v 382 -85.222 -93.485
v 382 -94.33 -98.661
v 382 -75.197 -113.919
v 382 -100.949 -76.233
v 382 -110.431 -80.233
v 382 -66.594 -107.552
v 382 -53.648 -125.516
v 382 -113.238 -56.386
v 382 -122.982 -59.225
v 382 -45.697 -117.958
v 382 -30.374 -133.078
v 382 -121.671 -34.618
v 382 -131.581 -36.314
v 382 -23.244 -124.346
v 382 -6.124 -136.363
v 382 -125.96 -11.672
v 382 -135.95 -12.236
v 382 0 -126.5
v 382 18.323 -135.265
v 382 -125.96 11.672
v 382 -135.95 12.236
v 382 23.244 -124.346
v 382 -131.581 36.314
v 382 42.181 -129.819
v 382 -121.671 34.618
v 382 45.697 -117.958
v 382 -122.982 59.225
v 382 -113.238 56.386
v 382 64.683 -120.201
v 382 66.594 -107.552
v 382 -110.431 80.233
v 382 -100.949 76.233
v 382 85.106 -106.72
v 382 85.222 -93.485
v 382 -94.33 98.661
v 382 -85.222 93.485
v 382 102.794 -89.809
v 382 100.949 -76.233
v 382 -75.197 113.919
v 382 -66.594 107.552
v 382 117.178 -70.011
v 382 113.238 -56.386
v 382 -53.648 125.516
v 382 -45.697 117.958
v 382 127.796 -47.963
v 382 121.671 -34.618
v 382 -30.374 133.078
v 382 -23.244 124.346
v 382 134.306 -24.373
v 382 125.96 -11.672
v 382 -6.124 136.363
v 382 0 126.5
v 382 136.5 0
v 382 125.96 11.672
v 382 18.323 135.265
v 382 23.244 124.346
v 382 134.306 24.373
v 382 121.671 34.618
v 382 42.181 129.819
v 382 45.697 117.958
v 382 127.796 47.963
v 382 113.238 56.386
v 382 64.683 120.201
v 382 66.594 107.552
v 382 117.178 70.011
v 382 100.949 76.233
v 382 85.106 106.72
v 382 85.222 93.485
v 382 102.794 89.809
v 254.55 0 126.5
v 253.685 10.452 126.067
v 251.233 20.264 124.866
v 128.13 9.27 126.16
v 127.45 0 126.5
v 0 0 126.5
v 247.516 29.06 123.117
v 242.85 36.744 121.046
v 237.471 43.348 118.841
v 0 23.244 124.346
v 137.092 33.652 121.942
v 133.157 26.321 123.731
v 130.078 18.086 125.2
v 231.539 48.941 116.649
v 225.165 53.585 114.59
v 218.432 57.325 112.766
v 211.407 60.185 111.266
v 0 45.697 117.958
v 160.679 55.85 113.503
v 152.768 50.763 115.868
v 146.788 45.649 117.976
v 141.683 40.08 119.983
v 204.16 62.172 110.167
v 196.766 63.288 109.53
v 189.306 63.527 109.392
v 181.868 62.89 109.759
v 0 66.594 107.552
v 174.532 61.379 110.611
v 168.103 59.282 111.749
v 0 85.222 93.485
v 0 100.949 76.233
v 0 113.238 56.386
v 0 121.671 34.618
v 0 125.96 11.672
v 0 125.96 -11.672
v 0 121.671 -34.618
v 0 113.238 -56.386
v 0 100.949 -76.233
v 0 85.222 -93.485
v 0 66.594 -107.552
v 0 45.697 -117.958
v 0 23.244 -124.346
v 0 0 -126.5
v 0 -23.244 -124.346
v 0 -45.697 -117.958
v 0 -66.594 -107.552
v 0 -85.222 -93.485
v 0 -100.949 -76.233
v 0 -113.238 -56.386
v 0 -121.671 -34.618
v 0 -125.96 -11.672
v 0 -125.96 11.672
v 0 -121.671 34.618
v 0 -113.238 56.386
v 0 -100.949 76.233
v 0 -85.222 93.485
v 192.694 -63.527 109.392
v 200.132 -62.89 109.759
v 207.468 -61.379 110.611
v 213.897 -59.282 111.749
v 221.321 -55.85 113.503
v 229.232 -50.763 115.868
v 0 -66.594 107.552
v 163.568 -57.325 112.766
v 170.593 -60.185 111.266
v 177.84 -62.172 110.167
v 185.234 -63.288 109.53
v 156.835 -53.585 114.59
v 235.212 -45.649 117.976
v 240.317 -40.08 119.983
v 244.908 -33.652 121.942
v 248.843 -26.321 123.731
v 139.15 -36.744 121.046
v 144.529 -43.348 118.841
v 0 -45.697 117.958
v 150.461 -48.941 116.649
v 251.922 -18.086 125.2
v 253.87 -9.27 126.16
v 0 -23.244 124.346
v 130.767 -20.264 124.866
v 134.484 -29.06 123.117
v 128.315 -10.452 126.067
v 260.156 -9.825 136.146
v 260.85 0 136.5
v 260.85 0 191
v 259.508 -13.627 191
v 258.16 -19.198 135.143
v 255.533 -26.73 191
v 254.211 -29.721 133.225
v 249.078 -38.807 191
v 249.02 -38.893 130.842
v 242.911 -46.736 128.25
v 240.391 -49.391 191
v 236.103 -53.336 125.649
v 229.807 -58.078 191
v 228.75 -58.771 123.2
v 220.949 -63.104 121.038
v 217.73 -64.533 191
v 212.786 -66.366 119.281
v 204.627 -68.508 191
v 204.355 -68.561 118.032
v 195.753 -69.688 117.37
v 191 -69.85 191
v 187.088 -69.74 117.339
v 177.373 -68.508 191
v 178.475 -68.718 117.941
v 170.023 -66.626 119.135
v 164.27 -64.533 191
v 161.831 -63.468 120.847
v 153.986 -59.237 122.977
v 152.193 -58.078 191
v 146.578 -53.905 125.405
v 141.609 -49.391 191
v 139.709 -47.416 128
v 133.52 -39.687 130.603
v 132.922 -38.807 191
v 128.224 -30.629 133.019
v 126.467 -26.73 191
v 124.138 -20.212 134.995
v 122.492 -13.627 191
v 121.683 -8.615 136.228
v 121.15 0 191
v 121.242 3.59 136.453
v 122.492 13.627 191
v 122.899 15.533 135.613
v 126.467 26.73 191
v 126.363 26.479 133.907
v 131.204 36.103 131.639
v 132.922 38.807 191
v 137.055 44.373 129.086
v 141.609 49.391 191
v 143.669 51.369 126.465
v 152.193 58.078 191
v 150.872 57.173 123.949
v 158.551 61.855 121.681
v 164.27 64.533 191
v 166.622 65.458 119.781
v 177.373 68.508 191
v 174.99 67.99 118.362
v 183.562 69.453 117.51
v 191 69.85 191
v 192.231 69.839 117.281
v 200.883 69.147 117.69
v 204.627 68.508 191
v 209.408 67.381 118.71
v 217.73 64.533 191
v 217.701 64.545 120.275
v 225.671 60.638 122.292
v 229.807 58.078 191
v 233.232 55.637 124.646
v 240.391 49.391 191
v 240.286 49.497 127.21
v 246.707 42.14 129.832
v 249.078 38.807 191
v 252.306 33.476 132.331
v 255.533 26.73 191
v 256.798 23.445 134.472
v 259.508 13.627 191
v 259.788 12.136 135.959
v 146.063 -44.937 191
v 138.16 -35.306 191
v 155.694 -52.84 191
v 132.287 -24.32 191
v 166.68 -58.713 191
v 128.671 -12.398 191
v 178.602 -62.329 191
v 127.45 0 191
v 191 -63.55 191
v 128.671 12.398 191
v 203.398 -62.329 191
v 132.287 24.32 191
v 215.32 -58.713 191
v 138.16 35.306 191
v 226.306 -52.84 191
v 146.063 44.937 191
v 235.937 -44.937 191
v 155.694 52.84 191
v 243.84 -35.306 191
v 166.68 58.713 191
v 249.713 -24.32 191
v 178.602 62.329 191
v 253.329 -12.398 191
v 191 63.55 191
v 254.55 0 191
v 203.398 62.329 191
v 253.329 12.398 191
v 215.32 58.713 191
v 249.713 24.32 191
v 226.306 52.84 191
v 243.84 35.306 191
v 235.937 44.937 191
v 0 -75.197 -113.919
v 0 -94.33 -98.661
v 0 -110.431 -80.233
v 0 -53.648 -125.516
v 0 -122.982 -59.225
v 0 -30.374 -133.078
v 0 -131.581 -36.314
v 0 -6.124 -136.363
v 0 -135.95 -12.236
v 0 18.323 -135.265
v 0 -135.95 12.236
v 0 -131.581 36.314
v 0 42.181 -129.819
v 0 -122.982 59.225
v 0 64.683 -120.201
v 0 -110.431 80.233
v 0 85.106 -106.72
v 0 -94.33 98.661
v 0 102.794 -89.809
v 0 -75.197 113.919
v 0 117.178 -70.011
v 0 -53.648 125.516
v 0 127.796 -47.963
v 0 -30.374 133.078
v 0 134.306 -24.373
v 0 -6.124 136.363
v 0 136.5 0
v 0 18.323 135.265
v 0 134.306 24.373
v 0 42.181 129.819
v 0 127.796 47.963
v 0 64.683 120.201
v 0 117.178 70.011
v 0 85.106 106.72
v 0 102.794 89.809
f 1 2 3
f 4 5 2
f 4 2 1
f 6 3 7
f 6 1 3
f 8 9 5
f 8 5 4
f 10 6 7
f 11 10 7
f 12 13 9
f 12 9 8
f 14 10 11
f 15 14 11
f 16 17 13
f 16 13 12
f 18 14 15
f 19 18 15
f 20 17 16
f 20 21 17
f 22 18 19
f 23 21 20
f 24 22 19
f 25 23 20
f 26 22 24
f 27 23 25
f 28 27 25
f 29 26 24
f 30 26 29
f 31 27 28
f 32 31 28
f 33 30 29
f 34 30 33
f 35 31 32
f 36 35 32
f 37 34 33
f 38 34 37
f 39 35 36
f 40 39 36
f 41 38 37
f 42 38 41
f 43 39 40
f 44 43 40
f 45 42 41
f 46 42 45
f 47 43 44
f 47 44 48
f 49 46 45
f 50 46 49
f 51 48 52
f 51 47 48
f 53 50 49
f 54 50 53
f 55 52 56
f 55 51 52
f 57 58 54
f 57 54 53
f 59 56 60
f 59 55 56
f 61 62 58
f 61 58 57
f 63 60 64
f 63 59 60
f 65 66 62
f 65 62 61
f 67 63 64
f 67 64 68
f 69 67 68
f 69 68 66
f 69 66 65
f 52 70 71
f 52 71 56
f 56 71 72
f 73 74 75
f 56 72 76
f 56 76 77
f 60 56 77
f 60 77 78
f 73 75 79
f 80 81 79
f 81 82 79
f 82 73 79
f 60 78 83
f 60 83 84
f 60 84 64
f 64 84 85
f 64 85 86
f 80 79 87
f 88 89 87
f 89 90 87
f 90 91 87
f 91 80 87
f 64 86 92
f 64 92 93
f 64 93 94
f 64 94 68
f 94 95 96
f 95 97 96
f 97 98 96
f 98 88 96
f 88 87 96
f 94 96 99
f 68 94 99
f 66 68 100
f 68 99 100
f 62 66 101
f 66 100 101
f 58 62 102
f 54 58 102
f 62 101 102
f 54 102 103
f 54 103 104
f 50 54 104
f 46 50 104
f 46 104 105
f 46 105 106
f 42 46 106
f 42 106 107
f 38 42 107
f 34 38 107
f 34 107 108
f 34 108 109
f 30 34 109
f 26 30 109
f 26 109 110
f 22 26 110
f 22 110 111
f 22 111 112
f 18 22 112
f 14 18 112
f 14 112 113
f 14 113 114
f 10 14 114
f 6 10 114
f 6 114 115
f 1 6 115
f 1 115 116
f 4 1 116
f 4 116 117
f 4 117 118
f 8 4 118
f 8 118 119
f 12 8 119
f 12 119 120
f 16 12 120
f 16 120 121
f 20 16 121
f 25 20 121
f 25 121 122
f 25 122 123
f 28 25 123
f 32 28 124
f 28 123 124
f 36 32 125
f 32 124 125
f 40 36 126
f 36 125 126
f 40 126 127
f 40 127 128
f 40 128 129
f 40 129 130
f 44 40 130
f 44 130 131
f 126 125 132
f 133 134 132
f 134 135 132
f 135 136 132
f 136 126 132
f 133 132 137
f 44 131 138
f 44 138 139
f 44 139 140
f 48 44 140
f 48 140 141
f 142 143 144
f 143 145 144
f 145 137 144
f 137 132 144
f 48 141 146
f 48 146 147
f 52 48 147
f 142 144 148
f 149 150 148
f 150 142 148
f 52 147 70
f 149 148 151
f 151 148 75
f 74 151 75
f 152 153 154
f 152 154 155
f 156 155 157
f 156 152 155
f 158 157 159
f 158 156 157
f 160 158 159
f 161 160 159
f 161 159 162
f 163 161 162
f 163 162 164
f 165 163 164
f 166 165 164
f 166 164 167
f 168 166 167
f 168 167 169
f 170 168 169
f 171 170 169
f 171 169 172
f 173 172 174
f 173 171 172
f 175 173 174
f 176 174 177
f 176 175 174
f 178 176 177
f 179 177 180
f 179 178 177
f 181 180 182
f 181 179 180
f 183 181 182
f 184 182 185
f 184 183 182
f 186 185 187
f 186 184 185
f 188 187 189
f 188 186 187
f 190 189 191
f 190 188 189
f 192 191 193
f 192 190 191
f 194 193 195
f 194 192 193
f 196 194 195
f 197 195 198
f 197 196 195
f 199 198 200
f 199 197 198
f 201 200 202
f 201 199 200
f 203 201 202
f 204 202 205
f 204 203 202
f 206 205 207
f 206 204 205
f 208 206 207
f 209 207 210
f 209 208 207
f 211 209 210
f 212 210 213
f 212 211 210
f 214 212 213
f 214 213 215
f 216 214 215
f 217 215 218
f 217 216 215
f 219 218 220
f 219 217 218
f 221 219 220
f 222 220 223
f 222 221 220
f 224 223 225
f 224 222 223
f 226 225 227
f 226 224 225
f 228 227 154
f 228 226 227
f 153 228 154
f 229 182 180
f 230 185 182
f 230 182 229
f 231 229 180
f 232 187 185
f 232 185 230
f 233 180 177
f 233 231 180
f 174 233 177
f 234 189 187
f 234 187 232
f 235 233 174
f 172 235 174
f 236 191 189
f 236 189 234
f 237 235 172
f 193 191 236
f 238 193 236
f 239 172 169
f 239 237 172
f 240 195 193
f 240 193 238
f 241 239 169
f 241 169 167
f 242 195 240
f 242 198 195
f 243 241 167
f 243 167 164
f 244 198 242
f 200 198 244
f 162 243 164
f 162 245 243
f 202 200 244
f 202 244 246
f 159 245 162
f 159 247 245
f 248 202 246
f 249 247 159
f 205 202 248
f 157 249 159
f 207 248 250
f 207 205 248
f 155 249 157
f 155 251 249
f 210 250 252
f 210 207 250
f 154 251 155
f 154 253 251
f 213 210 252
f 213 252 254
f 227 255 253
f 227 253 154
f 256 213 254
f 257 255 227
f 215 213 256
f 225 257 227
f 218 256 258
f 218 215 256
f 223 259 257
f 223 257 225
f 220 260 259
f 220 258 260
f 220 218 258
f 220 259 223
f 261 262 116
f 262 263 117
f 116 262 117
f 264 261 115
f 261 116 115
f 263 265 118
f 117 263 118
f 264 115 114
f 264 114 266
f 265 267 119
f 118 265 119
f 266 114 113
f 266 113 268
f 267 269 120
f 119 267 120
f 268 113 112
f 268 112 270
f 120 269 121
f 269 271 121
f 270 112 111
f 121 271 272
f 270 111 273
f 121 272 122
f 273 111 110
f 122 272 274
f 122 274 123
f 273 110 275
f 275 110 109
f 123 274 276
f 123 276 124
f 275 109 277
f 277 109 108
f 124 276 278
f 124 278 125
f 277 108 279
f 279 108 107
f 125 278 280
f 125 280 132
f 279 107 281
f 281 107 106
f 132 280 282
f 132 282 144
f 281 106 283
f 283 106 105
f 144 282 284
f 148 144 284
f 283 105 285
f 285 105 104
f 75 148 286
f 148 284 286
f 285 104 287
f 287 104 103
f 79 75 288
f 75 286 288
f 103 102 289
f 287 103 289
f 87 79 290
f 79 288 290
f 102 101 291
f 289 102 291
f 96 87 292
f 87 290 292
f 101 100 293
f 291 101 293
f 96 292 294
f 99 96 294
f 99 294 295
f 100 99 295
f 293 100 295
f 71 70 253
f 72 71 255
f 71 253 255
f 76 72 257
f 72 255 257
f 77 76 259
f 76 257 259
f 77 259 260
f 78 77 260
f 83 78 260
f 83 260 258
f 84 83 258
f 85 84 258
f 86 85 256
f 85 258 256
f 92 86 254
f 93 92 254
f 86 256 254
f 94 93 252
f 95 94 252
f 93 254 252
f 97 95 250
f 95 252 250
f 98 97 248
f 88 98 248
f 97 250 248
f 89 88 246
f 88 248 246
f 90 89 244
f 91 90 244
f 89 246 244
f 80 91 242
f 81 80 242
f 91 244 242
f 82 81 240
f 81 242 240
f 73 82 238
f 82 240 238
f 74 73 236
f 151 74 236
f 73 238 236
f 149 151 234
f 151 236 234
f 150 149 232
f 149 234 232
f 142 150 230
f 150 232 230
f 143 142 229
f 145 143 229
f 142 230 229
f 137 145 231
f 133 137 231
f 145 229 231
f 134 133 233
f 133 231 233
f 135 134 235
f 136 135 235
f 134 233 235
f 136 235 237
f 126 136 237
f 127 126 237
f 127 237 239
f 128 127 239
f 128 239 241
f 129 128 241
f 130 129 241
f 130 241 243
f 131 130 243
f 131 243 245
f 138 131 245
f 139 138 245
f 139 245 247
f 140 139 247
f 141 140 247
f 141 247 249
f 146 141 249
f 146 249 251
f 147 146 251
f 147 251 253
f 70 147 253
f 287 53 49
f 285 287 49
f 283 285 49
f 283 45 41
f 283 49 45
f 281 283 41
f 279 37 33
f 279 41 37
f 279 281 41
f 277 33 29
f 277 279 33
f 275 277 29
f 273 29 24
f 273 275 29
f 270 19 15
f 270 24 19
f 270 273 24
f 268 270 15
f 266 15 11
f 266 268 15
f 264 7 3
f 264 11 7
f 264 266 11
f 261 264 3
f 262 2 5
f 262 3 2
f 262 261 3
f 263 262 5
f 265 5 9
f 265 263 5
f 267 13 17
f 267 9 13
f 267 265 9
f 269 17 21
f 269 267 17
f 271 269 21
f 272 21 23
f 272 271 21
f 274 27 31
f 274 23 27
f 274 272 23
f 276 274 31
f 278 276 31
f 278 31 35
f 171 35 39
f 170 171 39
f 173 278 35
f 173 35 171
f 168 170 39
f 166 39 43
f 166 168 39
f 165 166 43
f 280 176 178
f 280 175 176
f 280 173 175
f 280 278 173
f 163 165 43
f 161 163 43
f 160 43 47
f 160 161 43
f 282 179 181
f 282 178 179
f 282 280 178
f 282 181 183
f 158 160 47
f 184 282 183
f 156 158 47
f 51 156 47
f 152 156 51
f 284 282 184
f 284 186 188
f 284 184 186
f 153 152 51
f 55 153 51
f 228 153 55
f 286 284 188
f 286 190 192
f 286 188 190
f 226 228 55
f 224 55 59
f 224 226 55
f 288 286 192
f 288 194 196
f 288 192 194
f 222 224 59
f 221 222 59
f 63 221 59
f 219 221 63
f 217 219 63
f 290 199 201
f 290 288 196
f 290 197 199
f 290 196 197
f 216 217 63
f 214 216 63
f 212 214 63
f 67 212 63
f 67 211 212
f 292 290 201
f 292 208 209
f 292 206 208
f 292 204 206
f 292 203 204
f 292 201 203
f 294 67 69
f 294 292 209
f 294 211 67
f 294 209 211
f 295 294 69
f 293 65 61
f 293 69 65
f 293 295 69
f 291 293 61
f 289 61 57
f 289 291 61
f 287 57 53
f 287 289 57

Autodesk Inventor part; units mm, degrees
ref_plane "YZ Plane" through (0, 0, 0) normal (1, 0, 0) x (0, 1, 0)
ref_plane "XZ Plane" through (0, 0, 0) normal (0, 1, 0) x (-1, 0, 0)
ref_plane "XY Plane" through (0, 0, 0) normal (0, 0, 1) x (1, 0, 0)
sketch "Sketch1" plane through (0, 0, 0) normal (1, 0, 0) x (0, 1, 0)
  circle A0 centre (0, 0) radius 136.5
  dimension "d0" = 273
extrude "Extrusion1" add sketch "Sketch1" along normal blind 382
sketch "Sketch2" plane through (0, 0, 0) normal (0, 0, 1) x (1, 0, 0)
  line L0 (0, 136.5) -> (0, -136.5) projected
  line L1 (382, 136.5) -> (382, -136.5) projected
  line L2 (0, 0) -> (382, 0) construction
  circle A0 centre (191, 0) radius 69.85
  dimension "d3" = 139.7
extrude "Extrusion2" add sketch "Sketch2" along normal blind 191
sketch "Sketch3" plane through (0, 0, 0) normal (-1, 0, 0) x (0, 0, 1)
  circle A0 centre (0, 0) radius 136.5 projected
  circle A1 centre (0, 0) radius 126.5
  dimension "d6" = 253
extrude "Extrusion3" cut sketch "Sketch3" against normal through all contours A1
sketch "Sketch4" plane through (191, 0, 191) normal (0, 0, 1) x (1, 0, 0)
  circle A0 centre (0, 0) radius 69.85 projected
  circle A1 centre (0, 0) radius 63.55
  dimension "d9" = 127.1
extrude "Extrusion4" cut sketch "Sketch4" against normal up to next contours A1
equation "\"d0\" = D"
equation "\"d1\" = 2 * F1"
equation "\"d3\" = D1"
equation "\"d4\" = F1"
equation "\"d6\" = D - 2 * T"
equation "\"d7\" = F1"
equation "\"d9\" = D1 - 2 * T1"
equation "\"d10\" = F1"
equation "\"D\" = 273"
equation "\"F1\" = 191"
equation "\"D1\" = 139.7"
equation "\"T1\" = 6.3"
equation "\"Size_Designation\" = 1.2345"
equation "\"T\" = 10"
properties part number "ISO 5251 Переходный тройник DN250 x DN125 10" material "Нержавеющая сталь"
